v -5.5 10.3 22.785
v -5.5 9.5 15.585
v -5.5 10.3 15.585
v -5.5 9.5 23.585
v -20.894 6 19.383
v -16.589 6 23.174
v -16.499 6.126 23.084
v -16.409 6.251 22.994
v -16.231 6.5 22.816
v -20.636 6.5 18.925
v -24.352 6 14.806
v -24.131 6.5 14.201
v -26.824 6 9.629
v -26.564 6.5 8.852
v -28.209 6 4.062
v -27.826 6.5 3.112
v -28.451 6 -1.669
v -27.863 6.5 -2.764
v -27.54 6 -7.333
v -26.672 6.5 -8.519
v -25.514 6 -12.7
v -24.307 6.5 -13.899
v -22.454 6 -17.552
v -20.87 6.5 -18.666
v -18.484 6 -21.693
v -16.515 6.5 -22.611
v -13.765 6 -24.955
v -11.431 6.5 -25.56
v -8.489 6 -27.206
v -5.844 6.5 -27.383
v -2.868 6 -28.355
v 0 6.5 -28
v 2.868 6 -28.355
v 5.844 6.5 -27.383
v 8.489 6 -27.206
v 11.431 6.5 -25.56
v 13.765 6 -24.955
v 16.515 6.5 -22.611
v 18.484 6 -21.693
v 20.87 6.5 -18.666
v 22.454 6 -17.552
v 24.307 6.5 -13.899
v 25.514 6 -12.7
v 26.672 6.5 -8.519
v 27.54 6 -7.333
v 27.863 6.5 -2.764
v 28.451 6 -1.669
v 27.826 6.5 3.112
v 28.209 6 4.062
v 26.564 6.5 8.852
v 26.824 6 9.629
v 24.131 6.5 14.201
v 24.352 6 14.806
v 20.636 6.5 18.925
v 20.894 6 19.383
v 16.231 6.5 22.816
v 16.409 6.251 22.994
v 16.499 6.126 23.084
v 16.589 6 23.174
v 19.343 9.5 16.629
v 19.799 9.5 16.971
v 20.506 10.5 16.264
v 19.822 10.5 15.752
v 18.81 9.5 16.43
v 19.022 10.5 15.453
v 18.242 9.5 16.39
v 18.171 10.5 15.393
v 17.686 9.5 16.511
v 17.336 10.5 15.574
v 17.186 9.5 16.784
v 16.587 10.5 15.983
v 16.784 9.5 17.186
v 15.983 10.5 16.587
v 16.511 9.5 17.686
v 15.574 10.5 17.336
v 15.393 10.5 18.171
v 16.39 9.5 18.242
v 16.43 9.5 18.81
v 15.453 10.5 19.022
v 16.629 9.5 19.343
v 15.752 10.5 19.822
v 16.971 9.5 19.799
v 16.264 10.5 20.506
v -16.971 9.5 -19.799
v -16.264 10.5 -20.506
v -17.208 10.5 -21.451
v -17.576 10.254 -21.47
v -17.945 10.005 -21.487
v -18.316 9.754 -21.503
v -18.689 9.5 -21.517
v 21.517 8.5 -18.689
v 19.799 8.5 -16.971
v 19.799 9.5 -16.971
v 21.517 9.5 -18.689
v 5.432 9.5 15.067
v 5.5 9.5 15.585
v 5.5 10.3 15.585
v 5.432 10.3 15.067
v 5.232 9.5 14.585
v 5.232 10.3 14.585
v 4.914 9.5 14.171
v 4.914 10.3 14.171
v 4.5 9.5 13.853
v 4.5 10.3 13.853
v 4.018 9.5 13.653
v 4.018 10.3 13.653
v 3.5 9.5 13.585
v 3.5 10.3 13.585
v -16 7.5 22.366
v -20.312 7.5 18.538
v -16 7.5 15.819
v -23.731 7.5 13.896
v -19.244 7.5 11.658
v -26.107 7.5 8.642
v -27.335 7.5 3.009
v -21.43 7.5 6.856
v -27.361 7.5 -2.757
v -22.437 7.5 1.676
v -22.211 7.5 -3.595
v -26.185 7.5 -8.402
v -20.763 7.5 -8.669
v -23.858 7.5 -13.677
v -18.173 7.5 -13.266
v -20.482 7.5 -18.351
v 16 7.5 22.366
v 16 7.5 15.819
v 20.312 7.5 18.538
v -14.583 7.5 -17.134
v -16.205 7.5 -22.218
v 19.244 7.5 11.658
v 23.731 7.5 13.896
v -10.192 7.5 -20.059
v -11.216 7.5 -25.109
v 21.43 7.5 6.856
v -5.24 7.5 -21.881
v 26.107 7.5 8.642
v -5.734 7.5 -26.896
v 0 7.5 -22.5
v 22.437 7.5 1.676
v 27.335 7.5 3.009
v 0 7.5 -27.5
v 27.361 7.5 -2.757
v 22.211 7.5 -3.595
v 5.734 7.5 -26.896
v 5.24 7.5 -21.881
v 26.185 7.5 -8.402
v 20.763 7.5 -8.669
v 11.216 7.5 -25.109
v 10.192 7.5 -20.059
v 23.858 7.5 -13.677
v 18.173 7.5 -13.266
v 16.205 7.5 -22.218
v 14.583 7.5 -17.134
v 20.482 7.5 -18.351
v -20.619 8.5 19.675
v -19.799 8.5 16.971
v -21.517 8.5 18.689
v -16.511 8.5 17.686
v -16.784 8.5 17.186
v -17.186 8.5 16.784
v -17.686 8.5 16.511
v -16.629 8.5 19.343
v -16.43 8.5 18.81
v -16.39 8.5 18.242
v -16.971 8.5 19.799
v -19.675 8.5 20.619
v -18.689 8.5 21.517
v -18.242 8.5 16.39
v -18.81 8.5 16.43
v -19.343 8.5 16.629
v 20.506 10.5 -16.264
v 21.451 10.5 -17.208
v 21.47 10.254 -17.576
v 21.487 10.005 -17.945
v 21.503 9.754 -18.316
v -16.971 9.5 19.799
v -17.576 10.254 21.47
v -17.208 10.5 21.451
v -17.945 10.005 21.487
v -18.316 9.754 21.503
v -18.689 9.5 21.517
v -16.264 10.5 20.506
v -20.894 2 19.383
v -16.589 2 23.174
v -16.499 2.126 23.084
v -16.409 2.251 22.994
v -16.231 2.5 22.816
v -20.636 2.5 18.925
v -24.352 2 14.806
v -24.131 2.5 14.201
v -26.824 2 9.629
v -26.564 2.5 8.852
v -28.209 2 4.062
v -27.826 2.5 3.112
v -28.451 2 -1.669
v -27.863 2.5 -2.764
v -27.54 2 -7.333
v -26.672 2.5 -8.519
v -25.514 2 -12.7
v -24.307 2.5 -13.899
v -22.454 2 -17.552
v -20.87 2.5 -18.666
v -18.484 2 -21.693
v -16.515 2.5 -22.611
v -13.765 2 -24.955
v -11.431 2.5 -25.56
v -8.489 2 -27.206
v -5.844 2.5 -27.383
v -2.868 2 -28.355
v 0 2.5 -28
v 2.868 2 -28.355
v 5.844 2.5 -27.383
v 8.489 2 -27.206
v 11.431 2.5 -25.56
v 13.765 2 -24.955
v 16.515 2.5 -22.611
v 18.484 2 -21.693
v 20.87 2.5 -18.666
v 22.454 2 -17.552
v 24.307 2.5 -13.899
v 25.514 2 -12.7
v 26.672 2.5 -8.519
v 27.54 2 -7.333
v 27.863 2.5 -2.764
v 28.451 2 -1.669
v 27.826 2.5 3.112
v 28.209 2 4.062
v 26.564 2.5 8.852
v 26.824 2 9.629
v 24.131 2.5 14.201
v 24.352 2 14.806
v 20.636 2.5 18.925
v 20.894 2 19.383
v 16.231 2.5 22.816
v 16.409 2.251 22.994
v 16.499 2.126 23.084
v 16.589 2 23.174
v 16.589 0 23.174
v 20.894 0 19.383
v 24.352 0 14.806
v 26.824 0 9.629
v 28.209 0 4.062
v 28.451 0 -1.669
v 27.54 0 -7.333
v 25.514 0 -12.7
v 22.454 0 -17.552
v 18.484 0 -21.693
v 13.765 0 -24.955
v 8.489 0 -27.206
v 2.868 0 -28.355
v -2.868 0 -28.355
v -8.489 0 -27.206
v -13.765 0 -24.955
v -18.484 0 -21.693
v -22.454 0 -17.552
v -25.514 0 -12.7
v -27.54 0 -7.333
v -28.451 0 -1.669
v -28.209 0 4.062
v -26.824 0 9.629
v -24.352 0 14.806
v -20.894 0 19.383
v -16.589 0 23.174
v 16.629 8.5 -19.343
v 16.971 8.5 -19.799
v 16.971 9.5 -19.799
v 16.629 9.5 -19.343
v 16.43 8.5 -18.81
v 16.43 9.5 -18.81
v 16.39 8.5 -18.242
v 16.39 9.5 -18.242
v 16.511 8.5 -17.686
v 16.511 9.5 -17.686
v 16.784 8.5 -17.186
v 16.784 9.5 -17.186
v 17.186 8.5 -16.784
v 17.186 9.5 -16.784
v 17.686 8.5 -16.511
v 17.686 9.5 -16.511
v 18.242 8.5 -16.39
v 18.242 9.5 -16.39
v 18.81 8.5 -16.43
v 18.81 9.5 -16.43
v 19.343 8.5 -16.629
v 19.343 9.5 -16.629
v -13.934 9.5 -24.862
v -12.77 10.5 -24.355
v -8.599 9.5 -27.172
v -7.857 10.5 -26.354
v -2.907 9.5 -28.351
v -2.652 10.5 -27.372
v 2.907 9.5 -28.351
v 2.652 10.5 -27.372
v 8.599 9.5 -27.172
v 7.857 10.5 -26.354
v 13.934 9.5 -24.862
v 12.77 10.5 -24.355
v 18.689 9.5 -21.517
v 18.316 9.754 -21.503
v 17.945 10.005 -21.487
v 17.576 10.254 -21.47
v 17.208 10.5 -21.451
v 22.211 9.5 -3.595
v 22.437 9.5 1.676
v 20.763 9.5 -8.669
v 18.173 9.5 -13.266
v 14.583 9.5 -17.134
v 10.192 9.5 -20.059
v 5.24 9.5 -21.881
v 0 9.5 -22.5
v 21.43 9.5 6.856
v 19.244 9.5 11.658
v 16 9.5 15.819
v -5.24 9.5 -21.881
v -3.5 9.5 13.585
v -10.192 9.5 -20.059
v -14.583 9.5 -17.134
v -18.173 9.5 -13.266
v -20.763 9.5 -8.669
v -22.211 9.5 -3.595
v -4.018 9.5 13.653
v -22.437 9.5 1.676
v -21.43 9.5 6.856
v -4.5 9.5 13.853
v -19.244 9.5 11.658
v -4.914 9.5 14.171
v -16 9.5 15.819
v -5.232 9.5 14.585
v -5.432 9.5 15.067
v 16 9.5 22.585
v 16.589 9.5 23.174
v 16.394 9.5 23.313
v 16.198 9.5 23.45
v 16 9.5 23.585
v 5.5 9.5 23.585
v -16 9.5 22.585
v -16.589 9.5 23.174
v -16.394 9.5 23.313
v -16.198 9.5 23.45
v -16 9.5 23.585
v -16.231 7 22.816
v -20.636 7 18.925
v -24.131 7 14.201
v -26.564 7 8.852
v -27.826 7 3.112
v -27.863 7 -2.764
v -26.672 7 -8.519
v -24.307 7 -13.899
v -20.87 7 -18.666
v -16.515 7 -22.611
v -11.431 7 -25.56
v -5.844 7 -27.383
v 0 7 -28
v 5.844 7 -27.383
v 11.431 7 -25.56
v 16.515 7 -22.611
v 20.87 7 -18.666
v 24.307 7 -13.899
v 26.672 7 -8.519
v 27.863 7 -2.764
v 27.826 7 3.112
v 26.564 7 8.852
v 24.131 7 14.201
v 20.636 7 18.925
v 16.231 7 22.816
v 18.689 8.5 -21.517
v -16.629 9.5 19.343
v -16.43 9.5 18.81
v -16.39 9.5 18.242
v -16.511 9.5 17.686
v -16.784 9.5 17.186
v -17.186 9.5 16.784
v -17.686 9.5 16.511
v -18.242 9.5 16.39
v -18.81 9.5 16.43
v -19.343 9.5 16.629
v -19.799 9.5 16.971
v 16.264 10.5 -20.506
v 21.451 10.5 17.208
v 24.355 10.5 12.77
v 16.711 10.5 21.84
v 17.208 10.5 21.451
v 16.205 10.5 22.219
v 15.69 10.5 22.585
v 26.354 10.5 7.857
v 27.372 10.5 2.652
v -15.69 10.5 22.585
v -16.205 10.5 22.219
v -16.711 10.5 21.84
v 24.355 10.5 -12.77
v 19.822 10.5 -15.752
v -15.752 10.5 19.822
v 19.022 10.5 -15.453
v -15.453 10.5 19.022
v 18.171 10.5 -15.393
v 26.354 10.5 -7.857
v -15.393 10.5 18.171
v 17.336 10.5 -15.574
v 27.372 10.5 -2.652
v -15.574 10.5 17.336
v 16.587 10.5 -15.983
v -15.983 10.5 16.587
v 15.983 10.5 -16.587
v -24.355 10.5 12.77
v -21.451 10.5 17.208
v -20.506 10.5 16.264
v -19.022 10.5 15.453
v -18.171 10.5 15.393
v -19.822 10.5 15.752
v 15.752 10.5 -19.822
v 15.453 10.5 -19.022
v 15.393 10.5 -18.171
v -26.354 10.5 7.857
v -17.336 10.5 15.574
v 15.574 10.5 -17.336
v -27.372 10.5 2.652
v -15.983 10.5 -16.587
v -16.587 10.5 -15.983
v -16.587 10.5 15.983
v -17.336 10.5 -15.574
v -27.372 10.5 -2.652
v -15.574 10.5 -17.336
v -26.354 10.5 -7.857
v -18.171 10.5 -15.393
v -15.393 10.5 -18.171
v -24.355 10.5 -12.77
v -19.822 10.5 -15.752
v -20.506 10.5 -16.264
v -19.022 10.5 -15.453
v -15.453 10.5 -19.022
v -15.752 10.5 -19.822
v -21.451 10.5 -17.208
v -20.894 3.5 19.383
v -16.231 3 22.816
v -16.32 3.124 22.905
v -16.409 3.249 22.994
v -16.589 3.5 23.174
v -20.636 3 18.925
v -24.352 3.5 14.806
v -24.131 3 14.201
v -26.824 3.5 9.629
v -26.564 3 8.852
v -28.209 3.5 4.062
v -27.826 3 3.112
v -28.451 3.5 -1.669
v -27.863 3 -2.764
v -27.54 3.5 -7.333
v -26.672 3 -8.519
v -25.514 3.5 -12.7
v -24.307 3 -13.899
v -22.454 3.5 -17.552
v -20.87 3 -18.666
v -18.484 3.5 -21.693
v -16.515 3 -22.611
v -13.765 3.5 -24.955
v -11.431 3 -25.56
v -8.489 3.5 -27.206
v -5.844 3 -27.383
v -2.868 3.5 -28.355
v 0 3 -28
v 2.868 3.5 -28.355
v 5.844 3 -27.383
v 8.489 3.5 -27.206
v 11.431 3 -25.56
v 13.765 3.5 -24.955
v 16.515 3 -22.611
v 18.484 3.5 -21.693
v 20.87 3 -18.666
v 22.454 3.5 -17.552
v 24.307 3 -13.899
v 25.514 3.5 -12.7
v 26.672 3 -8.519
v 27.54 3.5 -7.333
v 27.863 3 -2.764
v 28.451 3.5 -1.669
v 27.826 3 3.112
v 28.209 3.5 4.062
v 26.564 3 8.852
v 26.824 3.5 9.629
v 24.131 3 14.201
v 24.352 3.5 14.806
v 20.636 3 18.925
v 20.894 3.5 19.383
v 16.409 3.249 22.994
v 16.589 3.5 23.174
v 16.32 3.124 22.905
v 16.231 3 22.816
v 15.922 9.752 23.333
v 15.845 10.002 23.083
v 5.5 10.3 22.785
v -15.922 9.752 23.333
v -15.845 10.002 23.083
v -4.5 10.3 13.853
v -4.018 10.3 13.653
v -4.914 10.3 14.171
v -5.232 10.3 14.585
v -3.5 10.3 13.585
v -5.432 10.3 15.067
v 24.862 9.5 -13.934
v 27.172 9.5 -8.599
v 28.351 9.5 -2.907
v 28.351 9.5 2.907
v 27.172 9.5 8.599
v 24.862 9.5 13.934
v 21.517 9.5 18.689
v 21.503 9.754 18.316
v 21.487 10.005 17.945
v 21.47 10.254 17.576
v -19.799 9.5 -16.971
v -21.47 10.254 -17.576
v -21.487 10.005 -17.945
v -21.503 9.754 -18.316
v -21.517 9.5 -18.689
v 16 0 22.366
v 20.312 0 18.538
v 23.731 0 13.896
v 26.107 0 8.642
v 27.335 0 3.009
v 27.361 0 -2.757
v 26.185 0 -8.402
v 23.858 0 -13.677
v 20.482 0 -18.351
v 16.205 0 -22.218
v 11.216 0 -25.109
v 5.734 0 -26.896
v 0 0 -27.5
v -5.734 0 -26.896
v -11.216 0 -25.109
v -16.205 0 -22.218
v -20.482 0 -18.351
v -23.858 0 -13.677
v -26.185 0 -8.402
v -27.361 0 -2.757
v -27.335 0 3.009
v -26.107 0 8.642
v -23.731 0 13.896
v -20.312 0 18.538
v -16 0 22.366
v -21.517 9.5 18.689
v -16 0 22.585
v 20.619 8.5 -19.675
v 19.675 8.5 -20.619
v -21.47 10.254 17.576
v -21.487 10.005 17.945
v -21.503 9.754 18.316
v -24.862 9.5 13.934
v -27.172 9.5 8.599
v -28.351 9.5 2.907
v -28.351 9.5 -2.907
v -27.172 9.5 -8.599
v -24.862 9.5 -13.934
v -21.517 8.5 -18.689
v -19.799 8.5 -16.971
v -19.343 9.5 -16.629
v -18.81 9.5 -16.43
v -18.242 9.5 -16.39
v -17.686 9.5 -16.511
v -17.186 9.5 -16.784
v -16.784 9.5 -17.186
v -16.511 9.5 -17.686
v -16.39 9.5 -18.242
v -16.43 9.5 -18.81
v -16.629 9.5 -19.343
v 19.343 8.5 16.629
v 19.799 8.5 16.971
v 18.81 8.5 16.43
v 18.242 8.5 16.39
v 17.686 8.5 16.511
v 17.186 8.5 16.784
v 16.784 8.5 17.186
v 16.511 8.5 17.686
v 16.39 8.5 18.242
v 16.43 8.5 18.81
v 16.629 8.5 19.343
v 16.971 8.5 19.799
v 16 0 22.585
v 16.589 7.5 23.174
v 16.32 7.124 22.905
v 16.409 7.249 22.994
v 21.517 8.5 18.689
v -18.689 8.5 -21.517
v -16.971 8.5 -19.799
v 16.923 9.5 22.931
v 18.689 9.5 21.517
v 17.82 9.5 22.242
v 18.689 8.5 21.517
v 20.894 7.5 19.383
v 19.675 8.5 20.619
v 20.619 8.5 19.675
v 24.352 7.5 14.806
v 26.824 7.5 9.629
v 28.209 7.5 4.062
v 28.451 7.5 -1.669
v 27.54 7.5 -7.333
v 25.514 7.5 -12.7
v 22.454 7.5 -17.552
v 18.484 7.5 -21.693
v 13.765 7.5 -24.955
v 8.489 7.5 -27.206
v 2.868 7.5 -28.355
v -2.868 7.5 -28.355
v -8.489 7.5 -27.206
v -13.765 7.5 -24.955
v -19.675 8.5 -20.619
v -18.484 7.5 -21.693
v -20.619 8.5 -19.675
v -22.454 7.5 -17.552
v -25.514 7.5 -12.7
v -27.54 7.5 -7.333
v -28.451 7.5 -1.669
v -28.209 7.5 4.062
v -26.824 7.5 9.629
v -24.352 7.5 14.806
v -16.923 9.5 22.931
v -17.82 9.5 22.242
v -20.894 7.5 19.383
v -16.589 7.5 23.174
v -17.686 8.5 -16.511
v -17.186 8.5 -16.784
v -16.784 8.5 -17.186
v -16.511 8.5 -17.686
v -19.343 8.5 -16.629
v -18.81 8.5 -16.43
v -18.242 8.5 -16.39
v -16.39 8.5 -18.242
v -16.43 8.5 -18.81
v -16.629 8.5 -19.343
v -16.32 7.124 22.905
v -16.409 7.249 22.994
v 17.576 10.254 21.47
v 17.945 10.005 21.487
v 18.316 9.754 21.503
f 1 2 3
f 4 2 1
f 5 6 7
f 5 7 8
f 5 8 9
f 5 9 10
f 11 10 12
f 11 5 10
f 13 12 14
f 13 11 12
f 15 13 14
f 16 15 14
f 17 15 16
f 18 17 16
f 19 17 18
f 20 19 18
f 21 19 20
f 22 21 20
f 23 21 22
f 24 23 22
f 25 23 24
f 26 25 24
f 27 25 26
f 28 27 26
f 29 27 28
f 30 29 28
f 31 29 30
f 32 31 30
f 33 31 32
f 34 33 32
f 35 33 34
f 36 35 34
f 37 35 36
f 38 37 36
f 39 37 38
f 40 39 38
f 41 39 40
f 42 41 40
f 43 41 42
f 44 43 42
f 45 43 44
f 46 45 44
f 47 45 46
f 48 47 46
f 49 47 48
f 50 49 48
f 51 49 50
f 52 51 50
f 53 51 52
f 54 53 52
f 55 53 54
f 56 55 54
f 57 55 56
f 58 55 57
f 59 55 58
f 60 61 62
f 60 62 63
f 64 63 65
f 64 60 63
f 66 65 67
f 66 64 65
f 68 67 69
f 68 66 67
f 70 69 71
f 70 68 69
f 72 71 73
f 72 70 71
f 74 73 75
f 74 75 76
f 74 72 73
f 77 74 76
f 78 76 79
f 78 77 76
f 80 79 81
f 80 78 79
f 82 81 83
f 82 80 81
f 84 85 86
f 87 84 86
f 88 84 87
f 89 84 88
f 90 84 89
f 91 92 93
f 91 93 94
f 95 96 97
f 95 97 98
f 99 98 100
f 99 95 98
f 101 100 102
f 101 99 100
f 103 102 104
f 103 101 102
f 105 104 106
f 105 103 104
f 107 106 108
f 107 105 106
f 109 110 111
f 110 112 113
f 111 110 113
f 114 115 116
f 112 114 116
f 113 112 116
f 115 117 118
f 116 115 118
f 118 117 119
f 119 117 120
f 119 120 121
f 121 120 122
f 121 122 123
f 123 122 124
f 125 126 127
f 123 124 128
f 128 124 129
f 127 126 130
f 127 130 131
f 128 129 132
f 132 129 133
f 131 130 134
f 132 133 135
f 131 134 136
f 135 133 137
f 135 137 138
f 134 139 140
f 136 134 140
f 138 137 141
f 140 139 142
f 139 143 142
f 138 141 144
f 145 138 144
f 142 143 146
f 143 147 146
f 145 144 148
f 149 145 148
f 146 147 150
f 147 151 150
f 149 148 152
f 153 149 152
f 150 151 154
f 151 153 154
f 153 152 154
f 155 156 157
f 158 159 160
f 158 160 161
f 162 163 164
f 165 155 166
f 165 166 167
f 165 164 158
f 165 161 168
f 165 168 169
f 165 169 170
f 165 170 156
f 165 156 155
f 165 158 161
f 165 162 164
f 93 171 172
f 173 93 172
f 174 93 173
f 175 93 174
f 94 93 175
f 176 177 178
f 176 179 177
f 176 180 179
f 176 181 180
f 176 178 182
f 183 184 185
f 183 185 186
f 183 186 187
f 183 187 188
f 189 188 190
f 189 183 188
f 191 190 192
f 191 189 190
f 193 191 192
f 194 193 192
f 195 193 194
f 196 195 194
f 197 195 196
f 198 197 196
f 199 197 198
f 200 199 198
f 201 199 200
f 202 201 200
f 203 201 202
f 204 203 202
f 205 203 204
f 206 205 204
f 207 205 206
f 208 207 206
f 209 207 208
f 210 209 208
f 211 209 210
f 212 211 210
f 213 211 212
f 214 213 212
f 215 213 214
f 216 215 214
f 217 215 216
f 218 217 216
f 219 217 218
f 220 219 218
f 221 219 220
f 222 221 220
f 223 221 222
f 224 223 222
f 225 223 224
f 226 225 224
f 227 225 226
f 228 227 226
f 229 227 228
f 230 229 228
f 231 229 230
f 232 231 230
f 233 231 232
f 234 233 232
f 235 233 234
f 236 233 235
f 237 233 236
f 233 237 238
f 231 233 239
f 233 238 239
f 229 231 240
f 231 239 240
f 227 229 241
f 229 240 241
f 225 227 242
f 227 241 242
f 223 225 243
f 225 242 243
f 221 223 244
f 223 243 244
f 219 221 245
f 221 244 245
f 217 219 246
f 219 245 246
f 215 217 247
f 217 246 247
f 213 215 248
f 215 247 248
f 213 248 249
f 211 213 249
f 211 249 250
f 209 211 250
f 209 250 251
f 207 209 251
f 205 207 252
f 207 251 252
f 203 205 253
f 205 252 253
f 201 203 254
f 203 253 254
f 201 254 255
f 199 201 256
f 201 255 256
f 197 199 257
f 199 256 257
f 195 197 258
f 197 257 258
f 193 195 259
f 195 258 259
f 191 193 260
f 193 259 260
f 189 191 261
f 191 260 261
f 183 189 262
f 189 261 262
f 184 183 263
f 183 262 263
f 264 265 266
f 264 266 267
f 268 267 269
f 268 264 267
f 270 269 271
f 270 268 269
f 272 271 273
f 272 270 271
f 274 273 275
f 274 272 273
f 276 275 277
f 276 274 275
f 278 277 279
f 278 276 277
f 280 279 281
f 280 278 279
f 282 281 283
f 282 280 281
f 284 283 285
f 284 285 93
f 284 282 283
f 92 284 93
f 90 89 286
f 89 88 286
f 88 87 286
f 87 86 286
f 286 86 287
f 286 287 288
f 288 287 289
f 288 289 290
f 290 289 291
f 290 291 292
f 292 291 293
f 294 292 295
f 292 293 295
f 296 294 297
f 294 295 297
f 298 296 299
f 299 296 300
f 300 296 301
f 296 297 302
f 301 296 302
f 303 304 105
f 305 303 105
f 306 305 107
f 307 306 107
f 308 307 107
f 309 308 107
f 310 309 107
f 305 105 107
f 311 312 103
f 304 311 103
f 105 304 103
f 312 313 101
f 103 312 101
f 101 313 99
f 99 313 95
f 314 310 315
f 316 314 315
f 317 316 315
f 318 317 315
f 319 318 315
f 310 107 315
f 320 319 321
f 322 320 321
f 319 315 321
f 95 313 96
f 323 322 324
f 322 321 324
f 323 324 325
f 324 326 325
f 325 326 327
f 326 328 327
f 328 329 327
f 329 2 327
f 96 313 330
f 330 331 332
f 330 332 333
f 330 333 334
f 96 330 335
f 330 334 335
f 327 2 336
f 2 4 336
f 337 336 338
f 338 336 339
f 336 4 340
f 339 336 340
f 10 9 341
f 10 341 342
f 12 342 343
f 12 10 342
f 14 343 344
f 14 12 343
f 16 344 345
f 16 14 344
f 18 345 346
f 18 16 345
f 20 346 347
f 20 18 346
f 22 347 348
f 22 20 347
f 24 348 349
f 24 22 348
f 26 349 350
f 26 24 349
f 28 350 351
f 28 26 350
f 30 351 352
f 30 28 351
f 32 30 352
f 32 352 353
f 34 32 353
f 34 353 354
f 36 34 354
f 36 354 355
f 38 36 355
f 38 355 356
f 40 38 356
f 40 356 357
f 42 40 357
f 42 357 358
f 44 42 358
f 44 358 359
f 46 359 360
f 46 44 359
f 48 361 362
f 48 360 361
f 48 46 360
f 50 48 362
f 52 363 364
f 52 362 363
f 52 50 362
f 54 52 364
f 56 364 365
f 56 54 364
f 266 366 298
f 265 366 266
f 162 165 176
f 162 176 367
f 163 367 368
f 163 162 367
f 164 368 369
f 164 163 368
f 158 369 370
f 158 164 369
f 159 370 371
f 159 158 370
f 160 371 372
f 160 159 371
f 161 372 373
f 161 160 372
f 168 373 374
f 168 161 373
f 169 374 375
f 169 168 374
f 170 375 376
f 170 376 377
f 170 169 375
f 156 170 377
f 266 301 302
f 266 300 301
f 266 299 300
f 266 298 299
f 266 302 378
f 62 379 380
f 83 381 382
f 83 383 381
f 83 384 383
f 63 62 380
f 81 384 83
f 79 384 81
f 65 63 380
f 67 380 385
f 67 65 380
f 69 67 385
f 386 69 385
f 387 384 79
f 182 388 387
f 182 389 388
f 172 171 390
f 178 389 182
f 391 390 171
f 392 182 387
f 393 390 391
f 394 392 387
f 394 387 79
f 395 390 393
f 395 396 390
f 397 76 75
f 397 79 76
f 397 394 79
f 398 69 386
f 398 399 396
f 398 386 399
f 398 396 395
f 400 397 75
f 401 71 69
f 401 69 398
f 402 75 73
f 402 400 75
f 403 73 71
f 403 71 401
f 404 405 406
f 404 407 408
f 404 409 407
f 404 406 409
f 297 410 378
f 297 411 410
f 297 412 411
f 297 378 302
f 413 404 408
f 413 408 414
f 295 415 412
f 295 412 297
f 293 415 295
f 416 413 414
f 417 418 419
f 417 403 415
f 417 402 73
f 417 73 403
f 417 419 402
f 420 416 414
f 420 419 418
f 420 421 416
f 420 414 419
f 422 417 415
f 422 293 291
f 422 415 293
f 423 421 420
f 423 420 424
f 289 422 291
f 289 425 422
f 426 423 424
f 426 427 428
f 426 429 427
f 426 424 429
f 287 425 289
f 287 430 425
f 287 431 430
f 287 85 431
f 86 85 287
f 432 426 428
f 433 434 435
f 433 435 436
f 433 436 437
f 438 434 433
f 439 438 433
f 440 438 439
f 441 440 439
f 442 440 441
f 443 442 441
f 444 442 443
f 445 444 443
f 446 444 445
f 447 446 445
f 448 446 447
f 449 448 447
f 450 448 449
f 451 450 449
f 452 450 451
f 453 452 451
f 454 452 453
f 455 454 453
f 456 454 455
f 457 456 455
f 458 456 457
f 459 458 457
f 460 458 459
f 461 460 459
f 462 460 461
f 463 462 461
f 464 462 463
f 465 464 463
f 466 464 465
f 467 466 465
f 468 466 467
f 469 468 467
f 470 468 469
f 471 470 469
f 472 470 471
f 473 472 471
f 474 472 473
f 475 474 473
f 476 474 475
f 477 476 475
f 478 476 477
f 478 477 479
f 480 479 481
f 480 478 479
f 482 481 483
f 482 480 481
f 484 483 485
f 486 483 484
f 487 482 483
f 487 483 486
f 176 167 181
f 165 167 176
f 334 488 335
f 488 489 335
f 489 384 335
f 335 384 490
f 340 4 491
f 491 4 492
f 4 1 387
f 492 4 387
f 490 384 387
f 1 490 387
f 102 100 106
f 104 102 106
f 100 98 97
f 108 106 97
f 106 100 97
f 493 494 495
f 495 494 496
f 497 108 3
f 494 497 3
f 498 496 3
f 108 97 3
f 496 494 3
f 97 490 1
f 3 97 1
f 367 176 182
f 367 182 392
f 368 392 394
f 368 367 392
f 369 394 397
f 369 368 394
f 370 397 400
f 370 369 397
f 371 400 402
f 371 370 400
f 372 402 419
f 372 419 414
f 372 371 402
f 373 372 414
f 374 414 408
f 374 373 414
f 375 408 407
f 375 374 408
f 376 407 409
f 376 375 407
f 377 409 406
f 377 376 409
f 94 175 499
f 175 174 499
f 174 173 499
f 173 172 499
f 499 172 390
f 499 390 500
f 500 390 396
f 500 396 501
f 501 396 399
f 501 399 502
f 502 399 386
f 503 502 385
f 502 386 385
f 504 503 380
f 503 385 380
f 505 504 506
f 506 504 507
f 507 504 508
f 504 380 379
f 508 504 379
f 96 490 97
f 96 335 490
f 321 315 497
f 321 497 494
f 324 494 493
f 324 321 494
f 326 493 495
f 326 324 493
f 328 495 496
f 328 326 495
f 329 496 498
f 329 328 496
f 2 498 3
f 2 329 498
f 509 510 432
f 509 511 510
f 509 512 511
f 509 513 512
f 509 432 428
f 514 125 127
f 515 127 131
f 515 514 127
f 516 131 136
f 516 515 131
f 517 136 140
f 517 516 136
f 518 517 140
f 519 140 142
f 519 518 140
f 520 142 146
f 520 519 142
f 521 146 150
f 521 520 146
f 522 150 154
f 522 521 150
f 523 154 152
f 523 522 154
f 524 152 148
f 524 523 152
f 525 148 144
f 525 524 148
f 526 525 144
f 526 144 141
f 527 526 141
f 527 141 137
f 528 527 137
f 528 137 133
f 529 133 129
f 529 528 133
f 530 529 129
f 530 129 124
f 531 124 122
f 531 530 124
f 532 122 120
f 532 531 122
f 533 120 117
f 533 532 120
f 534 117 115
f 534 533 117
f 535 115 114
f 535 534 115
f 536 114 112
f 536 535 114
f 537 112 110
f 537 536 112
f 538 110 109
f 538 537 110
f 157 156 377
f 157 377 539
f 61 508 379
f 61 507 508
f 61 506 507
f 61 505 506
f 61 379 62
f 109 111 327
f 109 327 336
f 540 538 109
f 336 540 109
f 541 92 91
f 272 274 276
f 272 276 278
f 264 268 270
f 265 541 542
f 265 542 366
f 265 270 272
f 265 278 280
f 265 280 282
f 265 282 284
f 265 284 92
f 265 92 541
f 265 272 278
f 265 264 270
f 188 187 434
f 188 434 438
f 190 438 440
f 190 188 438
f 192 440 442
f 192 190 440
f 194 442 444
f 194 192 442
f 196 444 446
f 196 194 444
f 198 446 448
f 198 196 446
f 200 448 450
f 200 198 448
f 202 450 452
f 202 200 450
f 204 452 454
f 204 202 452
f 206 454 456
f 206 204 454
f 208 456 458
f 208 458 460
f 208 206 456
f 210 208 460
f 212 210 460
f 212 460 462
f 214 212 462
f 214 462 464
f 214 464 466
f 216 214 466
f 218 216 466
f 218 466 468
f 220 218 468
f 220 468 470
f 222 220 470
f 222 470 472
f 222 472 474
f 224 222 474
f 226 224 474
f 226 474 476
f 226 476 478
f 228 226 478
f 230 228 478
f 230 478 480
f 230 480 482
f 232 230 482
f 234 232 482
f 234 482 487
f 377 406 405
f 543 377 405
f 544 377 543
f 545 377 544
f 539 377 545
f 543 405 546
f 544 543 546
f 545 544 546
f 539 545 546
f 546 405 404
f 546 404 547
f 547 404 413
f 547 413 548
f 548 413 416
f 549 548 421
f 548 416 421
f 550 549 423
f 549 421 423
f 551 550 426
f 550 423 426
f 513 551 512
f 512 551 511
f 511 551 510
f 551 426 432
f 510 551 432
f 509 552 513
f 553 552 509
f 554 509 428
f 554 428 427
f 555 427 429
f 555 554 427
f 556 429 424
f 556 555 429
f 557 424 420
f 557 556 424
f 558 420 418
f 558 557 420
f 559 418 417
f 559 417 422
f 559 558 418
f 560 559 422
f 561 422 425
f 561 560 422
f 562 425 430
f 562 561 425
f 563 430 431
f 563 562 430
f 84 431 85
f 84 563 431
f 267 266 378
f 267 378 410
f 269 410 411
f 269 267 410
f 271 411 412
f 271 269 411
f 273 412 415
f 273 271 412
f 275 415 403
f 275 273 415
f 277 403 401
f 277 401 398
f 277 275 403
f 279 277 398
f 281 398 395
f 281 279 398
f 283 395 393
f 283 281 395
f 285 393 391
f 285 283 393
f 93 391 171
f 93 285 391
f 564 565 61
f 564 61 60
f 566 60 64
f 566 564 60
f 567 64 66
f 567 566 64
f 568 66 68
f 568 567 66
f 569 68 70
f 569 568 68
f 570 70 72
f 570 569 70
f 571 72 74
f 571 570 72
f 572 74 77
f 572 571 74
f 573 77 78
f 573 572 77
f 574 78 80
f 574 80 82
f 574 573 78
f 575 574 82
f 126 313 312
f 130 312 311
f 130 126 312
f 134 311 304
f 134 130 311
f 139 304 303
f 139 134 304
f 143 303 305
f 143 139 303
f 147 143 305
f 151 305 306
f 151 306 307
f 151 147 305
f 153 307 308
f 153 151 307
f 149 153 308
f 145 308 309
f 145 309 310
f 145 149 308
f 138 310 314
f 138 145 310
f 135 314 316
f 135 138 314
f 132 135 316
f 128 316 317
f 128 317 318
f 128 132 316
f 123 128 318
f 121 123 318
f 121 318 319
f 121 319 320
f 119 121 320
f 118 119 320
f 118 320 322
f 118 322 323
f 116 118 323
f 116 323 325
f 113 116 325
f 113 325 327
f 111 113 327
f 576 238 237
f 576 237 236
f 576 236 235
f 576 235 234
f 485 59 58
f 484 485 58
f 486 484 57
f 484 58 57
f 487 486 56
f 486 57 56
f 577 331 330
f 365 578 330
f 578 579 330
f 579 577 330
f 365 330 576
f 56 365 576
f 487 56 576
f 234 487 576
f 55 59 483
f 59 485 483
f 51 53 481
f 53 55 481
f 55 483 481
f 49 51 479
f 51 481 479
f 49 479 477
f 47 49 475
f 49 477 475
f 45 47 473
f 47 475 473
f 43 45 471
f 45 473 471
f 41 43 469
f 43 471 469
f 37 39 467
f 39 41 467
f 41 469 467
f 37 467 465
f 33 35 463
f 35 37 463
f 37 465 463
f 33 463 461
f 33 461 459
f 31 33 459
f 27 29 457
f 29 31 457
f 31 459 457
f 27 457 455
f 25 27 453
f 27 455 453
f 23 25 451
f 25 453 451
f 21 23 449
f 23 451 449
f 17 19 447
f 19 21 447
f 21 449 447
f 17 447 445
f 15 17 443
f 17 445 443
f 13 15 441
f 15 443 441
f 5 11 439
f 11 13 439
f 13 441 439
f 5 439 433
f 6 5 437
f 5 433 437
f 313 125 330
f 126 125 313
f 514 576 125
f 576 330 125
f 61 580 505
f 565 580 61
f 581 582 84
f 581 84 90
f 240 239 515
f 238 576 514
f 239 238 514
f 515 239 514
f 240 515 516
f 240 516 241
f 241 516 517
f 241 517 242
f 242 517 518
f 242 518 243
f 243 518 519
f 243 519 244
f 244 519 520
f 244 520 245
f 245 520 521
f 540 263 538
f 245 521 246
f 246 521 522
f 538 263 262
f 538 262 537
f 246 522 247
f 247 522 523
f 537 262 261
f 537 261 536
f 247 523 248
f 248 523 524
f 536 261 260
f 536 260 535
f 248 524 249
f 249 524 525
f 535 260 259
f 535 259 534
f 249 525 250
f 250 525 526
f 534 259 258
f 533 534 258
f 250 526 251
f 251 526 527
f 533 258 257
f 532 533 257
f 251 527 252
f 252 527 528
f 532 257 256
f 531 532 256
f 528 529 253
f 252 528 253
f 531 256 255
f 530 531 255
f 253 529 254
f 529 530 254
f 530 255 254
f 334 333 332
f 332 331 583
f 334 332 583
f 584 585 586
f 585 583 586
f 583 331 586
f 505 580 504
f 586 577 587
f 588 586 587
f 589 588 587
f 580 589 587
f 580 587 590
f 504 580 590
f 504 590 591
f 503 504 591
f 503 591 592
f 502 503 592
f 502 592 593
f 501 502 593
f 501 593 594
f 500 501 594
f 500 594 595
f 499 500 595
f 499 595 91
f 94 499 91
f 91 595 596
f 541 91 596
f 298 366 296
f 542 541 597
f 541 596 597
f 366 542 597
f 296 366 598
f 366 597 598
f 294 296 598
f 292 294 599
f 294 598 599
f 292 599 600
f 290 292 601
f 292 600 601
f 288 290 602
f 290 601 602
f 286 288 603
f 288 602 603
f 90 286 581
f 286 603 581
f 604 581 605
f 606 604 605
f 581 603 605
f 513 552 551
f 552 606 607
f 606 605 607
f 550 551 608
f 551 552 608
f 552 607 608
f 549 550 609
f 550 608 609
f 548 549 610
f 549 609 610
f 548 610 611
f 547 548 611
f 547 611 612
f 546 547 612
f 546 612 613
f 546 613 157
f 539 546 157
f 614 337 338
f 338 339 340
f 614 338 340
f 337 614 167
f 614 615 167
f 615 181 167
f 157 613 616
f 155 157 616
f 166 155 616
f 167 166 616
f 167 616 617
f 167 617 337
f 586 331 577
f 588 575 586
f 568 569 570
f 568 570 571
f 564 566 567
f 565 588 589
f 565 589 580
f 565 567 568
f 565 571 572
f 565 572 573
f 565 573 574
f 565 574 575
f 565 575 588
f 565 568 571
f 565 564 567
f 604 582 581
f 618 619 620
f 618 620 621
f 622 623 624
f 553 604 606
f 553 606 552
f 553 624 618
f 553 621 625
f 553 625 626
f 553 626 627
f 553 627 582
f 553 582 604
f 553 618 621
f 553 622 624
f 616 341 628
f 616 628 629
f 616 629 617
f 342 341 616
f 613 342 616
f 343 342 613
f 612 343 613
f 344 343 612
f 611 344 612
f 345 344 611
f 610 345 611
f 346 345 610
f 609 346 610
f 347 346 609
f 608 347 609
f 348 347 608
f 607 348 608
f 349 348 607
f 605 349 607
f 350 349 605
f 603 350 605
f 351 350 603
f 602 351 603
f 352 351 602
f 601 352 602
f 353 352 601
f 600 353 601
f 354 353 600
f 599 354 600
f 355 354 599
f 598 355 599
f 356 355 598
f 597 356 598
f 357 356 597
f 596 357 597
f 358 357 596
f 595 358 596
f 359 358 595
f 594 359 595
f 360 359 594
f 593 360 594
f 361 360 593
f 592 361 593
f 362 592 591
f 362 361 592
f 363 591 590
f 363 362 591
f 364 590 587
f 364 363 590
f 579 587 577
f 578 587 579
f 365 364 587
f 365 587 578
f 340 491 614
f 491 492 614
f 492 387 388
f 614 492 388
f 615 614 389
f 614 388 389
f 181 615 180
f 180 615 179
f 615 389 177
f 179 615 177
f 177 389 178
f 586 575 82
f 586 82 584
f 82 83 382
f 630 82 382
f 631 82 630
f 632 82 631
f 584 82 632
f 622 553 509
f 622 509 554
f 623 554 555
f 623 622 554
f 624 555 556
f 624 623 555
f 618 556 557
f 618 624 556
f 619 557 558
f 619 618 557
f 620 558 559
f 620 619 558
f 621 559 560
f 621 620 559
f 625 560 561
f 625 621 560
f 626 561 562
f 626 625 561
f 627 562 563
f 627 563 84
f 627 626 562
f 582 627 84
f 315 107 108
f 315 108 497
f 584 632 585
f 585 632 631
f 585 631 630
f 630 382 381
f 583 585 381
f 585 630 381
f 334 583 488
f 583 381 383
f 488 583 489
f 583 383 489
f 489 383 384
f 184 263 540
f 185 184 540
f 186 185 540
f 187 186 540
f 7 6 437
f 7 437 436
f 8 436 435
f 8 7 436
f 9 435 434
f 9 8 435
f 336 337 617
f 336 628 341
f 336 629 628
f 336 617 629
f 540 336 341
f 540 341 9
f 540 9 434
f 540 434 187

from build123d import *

# Parameters (mm, degrees)
SKETCH1_R           = 28.5
BOSS_EXTRUDE1_DEPTH = 10.5
SHELL1_OUTLINE_R    = 27.5
SHELL1_DEPTH        = 7.5
CUT_EXTRUDE3_DEPTH  = 9.5
CUT_EXTRUDE4_DEPTH  = 42.409539964
CUT_EXTRUDE2_START  = -2
CUT_EXTRUDE2_DEPTH  = 2
CIRPATTERN1_COUNT   = 4
CHAMFER2_SIZE       = 1
CUT_EXTRUDE5_DEPTH  = 0.8
CHAMFER3_SIZE       = 1


with BuildPart() as part:
    # Sketch1 → Boss-Extrude1 (new body)
    with BuildSketch(Plane(origin=(0, 0, 0), x_dir=(1, 0, 0), z_dir=(0, 1, 0))):
        with Locations(Location((0, 0, 0), (0, 0, 90))):
            Circle(SKETCH1_R)
    extrude(amount=BOSS_EXTRUDE1_DEPTH)

    # Shell1: read off the stored shape, not the designer's step
    # Shell1 outline → Shell1 (cut)
    with BuildSketch(Plane(origin=(0, 0, 0), x_dir=(1, 0, 0), z_dir=(0, 1, 0))):
        Circle(SHELL1_OUTLINE_R)
    extrude(amount=SHELL1_DEPTH, mode=Mode.SUBTRACT)

    # Sketch6 → Cut-Extrude3 (cut)
    with BuildSketch(Plane.XZ):
        with BuildLine():
            Line((16, 28.5), (16, 15.81929202))
            ThreePointArc((16, 15.81929202), (0, -22.5), (-16, 15.81929202))
            Line((-16, 15.81929202), (-16, 28.5))
            Line((-16, 28.5), (16, 28.5))
        make_face()
    extrude(amount=-CUT_EXTRUDE3_DEPTH, mode=Mode.SUBTRACT)

    # Sketch7 → Cut-Extrude4 (cut, through all)
    with BuildSketch(Plane.XZ.offset(-9.5)):
        with BuildLine():
            Line((-16, 23.58495283), (16, 23.58495283))
            ThreePointArc((16, 23.58495283), (0, 28.5), (-16, 23.58495283))
        make_face()
    extrude(amount=-CUT_EXTRUDE4_DEPTH, mode=Mode.SUBTRACT)

    # Sketch3 → Cut-Extrude2 (cut)
    with BuildSketch(Plane(origin=(0, 10.5, 0), x_dir=(1, 0, 0), z_dir=(0, 1, 0)).offset(CUT_EXTRUDE2_START)):
        with BuildLine():
            Line((16.970562748, -19.798989873), (18.688646931, -21.517074055))
            ThreePointArc((18.688646931, -21.517074055), (20.152543264, -20.152543264), (21.517074055, -18.688646931))
            Line((21.517074055, -18.688646931), (19.798989873, -16.970562748))
            ThreePointArc((19.798989873, -16.970562748), (16.970562748, -16.970562748), (16.970562748, -19.798989873))
        make_face()
    cut_extrude2 = extrude(amount=CUT_EXTRUDE2_DEPTH, mode=Mode.SUBTRACT)

    # CirPattern1: Cut-Extrude2 ×4 about axis
    cirpattern1_axis = Axis((0, 0, 0), (0, 1, 0))
    for i in range(1, CIRPATTERN1_COUNT):
        add(cut_extrude2.rotate(cirpattern1_axis, i * 360 / CIRPATTERN1_COUNT), mode=Mode.SUBTRACT)

    # Chamfer2
    chamfer2_edges = [part.edges().sort_by_distance(p)[0] for p in [
        (-20.658031964, 10.5, 17.82960484),
        (-16.970562748, 10.5, 16.970562748),
        (-17.82960484, 10.5, 20.658031964),
        (-17.375114018, 10.5, 22.591047184),
        (0, 10.5, 23.58495283),
        (17.375114018, 10.5, 22.591047184),
        (17.82960484, 10.5, 20.658031964),
        (16.970562748, 10.5, 16.970562748),
        (20.658031964, 10.5, 17.82960484),
        (28.5, 10.5, 0),
        (20.658031964, 10.5, -17.82960484),
        (16.970562748, 10.5, -16.970562748),
        (17.82960484, 10.5, -20.658031964),
        (0, 10.5, -28.5),
        (-17.82960484, 10.5, -20.658031964),
        (-16.970562748, 10.5, -16.970562748),
        (-20.658031964, 10.5, -17.82960484),
        (-28.5, 10.5, 0),
    ]]
    chamfer(chamfer2_edges, length=CHAMFER2_SIZE - 0.0001)  # a hair under: the kernel refuses the full size

    # Sketch9 → Cut-Extrude5 (cut)
    with BuildSketch(Plane.XZ.offset(-9.5)):
        with BuildLine():
            Line((-5.5, 23.58495283), (5.5, 23.58495283))
            Line((5.5, 23.58495283), (5.5, 15.58495283))
            ThreePointArc((5.5, 15.58495283), (4.914213562, 14.170739268), (3.5, 13.58495283))
            Line((3.5, 13.58495283), (-3.5, 13.58495283))
            ThreePointArc((-3.5, 13.58495283), (-4.914213562, 14.170739268), (-5.5, 15.58495283))
            Line((-5.5, 15.58495283), (-5.5, 23.58495283))
        make_face()
    extrude(amount=-CUT_EXTRUDE5_DEPTH, mode=Mode.SUBTRACT)

    # Chamfer3
    # the kernel refuses this chamfer: 1, 0.719970543 mm, written as the material it takes off along each edge
    with BuildSketch(Plane(origin=(-16, 9.5, 23.58495283), x_dir=(-0.8204018927518858, 0, -0.5717873156770121), z_dir=(0, -1, 0))) as chamfer3_piece_1:
        with BuildLine():
            Line((0.71829317, 0), (CHAMFER3_SIZE * 0.571787315677, CHAMFER3_SIZE * 0.820401892752))
            Line((CHAMFER3_SIZE * 0.571787315677, CHAMFER3_SIZE * 0.820401892752), (0, 0))
            ThreePointArc((0, 0), (0.362660378, -0.00226279), (0.71829317, 0))
        make_face()
    extrude(amount=12.071682988, mode=Mode.SUBTRACT)
    with BuildSketch(Plane(origin=(16, 9.5, 23.58495283), x_dir=(0.8204018927518871, 0, -0.5717873156770101), z_dir=(0, -1, 0))) as chamfer3_piece_2:
        with BuildLine():
            Line((0.71829317, 0), (CHAMFER3_SIZE * 0.571787315677, -CHAMFER3_SIZE * 0.820401892752))
            Line((CHAMFER3_SIZE * 0.571787315677, -CHAMFER3_SIZE * 0.820401892752), (0, 0))
            ThreePointArc((0, 0), (0.362660378, 0.00226279), (0.71829317, 0))
        make_face()
    extrude(amount=12.071682988, mode=Mode.SUBTRACT)

    # Sketch11 → Cut-Revolve2 (revolve, cut)
    with BuildSketch(Plane.XY):
        Polygon((28, 7), (28, 6.5), (28.5, 6), (28.5, 3.5), (28, 3), (28, 2.5), (28.5, 2), (29.5, 2), (29.5, 7.5), (28.5, 7.5), align=None)
    revolve(axis=Axis((0, 43.121181377, 0), (0, -1, 0)), mode=Mode.SUBTRACT)


solid = part.part
